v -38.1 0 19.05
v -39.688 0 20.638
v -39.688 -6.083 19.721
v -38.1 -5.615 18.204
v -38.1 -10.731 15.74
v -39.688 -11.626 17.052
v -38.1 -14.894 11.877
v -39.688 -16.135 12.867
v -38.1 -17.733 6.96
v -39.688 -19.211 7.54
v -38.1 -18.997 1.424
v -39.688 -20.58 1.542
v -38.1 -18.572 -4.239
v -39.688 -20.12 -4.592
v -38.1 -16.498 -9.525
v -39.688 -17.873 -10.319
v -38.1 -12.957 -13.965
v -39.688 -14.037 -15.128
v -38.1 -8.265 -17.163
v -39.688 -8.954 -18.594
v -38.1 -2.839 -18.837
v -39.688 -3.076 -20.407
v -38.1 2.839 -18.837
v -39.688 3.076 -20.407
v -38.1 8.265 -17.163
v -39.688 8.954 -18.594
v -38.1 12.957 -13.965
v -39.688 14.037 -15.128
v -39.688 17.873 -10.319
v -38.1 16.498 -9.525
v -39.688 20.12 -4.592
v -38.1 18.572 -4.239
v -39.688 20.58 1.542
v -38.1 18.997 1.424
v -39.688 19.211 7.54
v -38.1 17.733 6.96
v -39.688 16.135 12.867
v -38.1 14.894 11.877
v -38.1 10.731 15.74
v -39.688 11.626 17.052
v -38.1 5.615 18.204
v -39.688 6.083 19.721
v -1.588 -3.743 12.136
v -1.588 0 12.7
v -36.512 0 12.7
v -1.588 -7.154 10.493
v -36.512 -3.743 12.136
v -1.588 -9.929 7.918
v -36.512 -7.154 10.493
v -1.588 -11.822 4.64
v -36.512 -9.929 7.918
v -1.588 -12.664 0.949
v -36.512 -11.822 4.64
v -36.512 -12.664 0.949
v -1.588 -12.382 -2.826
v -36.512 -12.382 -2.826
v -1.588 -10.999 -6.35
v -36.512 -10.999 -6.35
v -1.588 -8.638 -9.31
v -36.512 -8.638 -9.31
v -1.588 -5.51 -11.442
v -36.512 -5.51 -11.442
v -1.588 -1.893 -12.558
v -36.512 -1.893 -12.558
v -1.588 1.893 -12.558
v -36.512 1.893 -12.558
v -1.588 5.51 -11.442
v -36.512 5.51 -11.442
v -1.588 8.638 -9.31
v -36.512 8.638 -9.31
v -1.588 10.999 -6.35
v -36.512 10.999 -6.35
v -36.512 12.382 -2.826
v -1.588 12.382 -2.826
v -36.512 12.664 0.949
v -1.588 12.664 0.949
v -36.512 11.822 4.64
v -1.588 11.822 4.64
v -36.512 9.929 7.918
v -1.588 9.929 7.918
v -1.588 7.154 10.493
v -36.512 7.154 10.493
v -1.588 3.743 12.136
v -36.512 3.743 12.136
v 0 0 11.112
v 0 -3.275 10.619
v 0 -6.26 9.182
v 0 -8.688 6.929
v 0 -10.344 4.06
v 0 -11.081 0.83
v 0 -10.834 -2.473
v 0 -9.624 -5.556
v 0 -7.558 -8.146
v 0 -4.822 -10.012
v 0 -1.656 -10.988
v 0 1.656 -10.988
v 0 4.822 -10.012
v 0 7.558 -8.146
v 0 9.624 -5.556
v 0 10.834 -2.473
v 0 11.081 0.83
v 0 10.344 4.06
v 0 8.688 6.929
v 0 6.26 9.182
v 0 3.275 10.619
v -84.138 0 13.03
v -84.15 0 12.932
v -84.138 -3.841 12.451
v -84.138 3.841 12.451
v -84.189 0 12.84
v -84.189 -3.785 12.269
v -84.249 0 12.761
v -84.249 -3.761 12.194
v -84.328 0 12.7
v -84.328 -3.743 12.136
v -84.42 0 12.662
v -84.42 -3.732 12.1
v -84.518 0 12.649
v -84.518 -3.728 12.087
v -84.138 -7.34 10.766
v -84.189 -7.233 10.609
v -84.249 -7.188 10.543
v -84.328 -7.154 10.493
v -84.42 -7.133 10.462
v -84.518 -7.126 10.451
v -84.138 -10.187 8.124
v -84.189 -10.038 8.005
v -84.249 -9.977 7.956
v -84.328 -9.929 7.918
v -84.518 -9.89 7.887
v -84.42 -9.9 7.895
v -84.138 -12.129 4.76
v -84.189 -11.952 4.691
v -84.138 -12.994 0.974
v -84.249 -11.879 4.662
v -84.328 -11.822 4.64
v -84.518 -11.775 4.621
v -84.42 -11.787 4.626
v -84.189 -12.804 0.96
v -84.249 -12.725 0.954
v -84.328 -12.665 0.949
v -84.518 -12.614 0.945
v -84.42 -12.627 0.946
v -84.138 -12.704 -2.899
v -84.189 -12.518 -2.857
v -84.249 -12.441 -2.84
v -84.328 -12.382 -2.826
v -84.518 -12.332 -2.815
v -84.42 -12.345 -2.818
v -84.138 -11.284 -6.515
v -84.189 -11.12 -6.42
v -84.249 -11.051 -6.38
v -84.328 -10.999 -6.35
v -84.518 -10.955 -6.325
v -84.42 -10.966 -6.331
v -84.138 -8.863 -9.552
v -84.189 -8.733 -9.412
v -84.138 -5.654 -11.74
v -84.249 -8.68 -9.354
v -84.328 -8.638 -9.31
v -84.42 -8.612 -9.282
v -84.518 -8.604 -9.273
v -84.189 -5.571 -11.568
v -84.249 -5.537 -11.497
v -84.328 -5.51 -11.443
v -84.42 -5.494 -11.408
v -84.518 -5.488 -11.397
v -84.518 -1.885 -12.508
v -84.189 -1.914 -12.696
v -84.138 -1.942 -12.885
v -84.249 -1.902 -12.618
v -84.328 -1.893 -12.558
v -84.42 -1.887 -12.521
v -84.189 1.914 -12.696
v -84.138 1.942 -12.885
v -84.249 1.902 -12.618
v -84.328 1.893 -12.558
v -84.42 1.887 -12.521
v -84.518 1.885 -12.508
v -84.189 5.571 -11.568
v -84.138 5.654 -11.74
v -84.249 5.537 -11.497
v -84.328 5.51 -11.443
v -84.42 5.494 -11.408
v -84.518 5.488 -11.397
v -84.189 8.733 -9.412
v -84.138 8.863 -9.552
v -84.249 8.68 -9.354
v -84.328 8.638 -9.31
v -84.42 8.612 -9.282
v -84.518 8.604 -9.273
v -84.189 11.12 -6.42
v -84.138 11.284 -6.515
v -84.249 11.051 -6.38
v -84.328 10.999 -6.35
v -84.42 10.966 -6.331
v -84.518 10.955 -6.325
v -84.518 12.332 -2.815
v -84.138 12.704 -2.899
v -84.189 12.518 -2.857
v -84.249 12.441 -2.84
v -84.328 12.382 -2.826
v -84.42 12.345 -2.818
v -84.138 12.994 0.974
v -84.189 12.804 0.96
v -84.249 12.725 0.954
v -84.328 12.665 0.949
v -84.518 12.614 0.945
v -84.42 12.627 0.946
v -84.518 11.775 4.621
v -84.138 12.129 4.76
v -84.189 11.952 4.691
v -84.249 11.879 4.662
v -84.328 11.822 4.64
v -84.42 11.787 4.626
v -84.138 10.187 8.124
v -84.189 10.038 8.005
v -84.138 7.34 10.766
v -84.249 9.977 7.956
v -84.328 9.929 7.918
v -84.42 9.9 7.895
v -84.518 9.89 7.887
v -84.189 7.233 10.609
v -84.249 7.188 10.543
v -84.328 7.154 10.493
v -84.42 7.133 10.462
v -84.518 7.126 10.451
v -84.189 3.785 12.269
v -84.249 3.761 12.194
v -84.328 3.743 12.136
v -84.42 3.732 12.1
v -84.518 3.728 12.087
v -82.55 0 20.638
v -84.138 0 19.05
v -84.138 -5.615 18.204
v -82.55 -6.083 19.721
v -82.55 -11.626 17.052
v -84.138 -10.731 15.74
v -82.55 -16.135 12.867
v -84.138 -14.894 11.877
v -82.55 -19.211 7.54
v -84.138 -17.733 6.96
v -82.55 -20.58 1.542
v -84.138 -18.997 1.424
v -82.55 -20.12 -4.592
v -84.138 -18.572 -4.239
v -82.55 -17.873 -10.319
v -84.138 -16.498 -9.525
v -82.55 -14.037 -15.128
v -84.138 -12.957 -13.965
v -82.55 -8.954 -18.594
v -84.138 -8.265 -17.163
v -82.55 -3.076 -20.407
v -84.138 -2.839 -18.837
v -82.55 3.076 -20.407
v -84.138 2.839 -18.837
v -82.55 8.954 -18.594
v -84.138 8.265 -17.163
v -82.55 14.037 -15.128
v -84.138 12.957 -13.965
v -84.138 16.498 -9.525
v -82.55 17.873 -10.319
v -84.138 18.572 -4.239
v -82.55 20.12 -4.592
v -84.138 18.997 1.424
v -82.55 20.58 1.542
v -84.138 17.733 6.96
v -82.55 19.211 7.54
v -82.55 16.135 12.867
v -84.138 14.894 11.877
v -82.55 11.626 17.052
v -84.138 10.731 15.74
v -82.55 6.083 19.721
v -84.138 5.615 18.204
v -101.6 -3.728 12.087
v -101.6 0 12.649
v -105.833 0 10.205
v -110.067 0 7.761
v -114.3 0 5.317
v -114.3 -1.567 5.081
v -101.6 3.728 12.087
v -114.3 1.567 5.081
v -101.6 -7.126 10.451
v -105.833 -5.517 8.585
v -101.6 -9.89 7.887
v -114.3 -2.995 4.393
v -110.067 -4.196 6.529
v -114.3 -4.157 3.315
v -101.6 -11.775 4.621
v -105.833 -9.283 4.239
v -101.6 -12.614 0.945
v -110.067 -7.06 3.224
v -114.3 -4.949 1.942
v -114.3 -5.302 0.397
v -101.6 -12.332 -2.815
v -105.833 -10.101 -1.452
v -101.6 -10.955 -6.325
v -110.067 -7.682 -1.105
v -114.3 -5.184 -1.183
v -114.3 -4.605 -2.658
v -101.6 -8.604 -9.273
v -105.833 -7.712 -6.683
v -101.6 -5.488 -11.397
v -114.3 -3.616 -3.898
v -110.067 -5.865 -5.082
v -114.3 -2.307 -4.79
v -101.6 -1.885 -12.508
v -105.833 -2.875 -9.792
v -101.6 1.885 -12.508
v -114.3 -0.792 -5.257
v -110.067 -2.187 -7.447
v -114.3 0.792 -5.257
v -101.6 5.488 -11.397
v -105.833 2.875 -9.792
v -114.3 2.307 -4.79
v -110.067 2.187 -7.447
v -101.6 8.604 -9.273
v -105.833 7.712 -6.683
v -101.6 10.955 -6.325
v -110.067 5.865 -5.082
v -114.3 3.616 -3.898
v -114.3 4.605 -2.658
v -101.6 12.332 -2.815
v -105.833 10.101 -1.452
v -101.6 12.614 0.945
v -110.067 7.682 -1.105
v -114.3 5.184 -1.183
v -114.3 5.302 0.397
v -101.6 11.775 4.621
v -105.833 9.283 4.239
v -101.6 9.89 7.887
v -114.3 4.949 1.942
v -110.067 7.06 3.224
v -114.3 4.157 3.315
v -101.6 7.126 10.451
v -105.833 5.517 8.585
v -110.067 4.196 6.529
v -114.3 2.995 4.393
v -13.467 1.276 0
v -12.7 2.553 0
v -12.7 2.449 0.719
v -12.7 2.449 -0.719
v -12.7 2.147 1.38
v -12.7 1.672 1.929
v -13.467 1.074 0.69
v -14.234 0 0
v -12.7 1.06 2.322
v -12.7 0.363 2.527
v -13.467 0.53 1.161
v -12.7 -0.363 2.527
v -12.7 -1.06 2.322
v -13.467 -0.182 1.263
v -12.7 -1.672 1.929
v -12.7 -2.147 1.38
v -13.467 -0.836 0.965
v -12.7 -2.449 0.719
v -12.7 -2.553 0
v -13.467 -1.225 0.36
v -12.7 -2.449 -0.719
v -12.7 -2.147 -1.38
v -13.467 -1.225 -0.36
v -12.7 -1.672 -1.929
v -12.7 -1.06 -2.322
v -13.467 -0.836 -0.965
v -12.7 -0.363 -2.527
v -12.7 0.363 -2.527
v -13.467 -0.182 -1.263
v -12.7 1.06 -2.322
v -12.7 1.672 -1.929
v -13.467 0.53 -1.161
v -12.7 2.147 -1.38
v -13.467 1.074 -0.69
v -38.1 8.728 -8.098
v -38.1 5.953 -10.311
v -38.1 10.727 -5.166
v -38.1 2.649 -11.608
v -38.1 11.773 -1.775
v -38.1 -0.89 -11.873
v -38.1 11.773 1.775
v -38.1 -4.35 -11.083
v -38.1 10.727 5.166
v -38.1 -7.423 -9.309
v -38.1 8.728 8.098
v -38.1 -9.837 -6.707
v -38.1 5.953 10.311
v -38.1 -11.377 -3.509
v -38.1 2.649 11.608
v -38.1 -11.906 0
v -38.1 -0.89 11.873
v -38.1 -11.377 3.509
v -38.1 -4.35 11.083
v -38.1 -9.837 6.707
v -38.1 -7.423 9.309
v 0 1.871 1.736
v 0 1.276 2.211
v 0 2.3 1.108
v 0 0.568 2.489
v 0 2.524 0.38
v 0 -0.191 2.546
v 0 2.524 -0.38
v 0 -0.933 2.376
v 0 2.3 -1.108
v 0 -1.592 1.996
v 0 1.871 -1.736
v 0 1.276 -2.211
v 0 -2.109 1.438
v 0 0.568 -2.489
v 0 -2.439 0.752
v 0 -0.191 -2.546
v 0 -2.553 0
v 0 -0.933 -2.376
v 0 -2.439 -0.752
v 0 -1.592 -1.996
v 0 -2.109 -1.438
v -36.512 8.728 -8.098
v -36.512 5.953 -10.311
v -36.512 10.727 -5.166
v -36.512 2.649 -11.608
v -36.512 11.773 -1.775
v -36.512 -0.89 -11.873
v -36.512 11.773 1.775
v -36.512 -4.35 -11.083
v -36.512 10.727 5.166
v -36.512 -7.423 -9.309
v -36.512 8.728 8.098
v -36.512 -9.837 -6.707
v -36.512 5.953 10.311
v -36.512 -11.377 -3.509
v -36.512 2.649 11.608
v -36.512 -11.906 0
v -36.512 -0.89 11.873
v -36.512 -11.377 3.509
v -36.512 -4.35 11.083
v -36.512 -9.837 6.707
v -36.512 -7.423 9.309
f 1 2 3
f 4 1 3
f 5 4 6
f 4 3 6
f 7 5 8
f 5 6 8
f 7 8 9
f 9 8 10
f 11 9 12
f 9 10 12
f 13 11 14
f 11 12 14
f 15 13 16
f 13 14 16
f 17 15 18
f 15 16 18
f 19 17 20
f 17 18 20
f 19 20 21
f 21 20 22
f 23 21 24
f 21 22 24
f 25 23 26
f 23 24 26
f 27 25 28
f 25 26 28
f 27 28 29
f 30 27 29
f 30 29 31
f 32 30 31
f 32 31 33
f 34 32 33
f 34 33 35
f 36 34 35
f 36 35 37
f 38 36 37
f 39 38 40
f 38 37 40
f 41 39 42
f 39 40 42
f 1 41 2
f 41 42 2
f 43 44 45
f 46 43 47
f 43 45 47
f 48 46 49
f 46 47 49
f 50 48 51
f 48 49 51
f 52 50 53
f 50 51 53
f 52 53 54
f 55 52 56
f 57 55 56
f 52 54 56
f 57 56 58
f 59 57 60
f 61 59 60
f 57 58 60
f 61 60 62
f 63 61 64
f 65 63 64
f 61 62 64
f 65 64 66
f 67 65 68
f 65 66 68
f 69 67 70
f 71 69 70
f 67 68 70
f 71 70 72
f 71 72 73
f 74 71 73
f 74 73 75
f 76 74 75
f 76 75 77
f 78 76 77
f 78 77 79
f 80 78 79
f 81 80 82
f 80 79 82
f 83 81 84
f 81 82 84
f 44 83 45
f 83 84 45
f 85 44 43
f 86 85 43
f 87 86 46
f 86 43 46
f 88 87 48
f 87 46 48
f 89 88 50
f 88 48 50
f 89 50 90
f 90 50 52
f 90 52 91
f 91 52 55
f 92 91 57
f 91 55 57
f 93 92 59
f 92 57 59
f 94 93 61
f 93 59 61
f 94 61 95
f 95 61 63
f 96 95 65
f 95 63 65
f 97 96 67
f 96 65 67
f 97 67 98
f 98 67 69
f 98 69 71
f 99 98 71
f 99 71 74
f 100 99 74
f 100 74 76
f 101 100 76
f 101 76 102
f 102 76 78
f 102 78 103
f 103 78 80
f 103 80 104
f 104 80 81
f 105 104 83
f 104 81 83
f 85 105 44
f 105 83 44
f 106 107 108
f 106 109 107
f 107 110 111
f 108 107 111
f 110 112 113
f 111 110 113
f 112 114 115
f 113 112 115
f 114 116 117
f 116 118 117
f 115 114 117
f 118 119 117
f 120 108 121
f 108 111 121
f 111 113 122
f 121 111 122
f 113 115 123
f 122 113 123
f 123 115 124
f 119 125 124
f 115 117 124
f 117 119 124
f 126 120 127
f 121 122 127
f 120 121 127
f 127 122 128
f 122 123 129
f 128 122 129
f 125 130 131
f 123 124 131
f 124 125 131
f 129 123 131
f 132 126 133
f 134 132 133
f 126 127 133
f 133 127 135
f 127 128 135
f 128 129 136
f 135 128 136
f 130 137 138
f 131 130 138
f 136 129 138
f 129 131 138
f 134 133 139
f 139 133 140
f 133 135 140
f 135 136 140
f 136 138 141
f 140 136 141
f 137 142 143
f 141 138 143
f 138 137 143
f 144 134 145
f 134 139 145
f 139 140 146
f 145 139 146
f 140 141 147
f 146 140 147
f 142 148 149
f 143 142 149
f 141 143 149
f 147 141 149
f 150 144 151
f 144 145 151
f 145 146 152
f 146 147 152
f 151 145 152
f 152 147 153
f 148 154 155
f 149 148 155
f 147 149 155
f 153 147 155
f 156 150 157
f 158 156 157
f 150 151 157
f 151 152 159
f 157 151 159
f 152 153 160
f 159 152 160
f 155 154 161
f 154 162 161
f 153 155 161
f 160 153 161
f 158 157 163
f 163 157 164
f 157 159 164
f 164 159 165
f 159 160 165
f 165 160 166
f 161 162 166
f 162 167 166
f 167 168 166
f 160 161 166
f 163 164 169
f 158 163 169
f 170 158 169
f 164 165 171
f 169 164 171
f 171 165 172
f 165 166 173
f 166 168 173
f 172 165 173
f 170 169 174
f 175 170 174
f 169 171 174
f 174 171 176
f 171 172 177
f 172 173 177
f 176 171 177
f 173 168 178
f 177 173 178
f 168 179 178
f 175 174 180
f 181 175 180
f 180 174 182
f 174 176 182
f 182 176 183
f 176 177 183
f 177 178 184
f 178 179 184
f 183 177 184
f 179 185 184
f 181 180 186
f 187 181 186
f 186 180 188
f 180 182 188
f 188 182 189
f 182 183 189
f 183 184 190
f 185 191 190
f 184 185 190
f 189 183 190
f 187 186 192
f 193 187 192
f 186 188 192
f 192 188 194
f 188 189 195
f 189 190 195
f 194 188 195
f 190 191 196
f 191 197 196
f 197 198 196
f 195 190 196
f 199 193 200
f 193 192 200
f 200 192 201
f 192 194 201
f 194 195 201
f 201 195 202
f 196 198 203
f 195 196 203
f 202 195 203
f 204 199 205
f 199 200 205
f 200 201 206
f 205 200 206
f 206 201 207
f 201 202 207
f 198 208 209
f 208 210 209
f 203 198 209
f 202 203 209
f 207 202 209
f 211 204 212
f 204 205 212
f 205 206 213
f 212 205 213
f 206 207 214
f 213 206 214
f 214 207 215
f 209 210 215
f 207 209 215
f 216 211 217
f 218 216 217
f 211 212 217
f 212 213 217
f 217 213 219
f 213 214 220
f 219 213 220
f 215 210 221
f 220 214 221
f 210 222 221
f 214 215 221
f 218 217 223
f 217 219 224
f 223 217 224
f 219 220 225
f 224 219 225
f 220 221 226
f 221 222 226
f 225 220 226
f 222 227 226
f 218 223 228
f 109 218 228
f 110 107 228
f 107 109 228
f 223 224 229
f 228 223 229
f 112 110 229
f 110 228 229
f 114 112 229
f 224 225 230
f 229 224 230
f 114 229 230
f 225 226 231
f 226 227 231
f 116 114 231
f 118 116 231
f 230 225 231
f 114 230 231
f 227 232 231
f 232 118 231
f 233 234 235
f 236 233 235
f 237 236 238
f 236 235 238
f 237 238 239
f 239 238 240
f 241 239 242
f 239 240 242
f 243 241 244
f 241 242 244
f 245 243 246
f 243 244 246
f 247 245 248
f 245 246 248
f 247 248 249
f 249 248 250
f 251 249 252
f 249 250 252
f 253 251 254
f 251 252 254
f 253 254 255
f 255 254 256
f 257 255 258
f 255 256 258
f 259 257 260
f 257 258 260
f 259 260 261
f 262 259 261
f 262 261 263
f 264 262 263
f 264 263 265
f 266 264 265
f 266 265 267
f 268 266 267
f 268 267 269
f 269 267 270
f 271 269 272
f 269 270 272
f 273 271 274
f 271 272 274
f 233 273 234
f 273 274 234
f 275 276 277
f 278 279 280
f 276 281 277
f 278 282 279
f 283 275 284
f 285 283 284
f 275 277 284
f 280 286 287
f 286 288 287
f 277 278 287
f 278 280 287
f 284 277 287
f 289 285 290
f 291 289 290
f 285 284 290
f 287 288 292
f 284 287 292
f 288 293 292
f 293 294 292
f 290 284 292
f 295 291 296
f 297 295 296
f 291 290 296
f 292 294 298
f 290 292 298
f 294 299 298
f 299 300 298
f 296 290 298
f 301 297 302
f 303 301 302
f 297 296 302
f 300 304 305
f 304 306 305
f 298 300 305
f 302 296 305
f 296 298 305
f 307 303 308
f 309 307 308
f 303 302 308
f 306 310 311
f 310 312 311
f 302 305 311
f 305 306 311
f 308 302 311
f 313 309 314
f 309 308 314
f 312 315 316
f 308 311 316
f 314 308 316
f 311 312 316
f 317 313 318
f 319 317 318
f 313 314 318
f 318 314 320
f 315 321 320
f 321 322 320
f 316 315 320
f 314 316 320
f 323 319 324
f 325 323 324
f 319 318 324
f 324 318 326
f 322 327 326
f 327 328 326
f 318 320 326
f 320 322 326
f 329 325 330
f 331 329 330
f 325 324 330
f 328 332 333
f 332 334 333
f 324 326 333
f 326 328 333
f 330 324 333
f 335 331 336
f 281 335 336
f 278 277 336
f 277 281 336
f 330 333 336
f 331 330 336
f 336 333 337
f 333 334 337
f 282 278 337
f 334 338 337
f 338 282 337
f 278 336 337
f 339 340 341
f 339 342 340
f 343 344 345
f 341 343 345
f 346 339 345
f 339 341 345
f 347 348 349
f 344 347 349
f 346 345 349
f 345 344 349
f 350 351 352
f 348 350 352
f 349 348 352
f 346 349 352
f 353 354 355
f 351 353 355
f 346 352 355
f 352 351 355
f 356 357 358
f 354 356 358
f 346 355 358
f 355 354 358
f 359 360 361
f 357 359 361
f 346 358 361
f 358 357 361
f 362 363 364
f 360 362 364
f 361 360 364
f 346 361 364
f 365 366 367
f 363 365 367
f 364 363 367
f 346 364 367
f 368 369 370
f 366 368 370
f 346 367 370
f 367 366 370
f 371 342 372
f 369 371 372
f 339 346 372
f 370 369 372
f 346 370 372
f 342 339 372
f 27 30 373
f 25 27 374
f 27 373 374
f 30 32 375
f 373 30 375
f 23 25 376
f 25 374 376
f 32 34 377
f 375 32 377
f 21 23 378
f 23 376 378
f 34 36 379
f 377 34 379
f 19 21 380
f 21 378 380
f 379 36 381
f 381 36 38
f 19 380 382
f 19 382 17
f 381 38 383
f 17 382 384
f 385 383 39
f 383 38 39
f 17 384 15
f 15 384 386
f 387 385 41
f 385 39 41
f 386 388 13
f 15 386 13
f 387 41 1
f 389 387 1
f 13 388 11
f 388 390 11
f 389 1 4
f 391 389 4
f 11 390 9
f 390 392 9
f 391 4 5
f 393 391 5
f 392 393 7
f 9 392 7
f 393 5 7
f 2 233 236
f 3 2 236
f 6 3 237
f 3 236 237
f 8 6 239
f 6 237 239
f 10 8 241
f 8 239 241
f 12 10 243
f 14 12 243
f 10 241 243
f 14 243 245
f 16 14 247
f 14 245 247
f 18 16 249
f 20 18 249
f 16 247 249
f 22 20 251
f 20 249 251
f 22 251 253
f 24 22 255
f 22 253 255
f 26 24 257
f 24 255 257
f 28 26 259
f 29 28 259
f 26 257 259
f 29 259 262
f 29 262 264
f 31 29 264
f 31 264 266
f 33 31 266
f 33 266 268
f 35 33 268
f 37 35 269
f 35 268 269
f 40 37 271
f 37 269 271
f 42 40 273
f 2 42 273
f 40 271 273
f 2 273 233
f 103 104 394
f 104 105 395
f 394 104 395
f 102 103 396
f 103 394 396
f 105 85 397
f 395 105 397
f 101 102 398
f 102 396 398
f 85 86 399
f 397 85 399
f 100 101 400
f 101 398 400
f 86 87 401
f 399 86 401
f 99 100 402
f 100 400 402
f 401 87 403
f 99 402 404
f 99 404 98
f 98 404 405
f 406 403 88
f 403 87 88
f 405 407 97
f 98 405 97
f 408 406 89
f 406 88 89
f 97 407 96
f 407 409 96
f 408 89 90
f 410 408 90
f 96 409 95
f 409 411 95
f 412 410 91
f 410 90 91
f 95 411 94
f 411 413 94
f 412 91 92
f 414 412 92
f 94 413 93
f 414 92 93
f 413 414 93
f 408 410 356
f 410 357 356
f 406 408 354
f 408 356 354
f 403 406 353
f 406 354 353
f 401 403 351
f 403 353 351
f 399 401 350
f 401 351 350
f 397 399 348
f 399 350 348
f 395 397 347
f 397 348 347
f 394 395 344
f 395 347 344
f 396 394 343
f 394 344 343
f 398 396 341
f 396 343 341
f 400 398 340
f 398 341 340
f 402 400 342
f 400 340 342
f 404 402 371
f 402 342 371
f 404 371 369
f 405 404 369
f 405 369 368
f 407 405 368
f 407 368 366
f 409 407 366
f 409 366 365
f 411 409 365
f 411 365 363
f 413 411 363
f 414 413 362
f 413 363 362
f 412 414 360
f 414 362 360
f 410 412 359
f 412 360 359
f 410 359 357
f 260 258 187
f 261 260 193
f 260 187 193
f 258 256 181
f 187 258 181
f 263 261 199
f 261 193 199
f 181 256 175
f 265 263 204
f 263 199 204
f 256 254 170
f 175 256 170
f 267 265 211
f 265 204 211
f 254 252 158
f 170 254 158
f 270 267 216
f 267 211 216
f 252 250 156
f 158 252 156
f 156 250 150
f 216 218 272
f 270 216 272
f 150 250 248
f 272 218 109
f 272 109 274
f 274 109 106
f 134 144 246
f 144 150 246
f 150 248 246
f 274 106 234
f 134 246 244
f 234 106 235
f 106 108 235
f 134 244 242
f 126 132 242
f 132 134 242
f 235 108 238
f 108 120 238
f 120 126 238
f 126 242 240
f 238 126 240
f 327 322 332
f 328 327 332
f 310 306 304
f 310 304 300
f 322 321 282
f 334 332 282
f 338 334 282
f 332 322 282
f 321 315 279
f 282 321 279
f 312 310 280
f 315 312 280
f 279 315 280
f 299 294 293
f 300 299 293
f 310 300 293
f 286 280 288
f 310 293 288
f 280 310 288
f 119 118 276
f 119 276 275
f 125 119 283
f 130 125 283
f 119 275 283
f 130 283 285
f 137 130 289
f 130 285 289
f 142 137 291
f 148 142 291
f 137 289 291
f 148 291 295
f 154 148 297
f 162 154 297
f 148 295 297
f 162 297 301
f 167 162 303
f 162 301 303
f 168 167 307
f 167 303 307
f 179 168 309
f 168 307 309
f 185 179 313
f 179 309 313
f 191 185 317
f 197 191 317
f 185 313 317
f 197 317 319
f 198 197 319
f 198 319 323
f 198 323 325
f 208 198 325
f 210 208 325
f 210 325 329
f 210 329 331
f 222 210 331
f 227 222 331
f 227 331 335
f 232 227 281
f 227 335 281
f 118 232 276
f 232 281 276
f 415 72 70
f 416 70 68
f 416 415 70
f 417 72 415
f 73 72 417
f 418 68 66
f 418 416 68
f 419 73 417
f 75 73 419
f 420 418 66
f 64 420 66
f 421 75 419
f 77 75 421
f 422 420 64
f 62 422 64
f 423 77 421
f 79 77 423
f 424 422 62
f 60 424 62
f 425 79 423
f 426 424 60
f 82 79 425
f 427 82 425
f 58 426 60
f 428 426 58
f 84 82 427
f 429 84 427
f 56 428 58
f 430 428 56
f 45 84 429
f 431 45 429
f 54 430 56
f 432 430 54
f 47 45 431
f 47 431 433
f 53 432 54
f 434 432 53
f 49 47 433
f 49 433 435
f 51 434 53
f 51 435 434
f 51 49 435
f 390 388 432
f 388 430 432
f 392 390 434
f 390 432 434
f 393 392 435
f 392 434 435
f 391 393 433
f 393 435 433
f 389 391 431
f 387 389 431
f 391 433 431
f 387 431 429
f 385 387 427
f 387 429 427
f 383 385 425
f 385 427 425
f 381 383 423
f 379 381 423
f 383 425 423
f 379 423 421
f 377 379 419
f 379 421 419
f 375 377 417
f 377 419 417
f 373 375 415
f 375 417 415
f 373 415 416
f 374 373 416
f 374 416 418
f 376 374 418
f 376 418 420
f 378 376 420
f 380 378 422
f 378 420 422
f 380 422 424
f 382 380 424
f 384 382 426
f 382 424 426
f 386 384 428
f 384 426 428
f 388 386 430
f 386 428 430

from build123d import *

# Parameters (mm, degrees)
F2_W     = 1.5875
F2_H     = 0.79375
F4_SIZE  = 1.5875
F5_R     = 0.381
F7_D     = 5.1054
F7_DEPTH = 12.7
F7_TIP   = 1.5338169022


with BuildPart() as f1:
    # F0 (on Front) → F1 (revolve)
    with BuildSketch(Plane.XZ):
        Polygon((-114.3, 0), (0, 0), (0, 12.7), (-38.1, 12.7), (-38.1, 20.6375), (-84.1375, 20.6375), (-84.1375, 12.6492), (-101.6, 12.6492), (-114.3, 5.3168515813), align=None)
    revolve(axis=Axis((-57.15, 0, 0), (1, 0, 0)))

    # F2 (on Top) → F3 (revolve, cut)
    with BuildSketch(Plane.XY):
        with Locations((-37.30625, -12.303125)):
            Rectangle(F2_W, F2_H)
    revolve(axis=Axis((-65.0381594896, 0, 0), (-1, 0, 0)), mode=Mode.SUBTRACT)

    # F4
    f4_edges = [f1.edges().sort_by_distance(p)[0] for p in [
        (0, 0, -12.7),
        (-38.1, 0, -20.6375),
        (-84.1375, 0, -20.6375),
    ]]
    chamfer(f4_edges, length=F4_SIZE)

    # F5
    f5_edges = [f1.edges().sort_by_distance(p)[0] for p in [
        (-84.1375, 0, -12.6492),
    ]]
    fillet(f5_edges, radius=F5_R)

    # F7
    with Locations(Plane.YZ):
        with Locations((0, 0)):
            Hole(F7_D / 2, depth=F7_DEPTH)
            with Locations((0, 0, -(F7_DEPTH + F7_TIP / 2))):  # 118° drill point
                Cone(0, F7_D / 2, F7_TIP, mode=Mode.SUBTRACT)


solid = f1.part
